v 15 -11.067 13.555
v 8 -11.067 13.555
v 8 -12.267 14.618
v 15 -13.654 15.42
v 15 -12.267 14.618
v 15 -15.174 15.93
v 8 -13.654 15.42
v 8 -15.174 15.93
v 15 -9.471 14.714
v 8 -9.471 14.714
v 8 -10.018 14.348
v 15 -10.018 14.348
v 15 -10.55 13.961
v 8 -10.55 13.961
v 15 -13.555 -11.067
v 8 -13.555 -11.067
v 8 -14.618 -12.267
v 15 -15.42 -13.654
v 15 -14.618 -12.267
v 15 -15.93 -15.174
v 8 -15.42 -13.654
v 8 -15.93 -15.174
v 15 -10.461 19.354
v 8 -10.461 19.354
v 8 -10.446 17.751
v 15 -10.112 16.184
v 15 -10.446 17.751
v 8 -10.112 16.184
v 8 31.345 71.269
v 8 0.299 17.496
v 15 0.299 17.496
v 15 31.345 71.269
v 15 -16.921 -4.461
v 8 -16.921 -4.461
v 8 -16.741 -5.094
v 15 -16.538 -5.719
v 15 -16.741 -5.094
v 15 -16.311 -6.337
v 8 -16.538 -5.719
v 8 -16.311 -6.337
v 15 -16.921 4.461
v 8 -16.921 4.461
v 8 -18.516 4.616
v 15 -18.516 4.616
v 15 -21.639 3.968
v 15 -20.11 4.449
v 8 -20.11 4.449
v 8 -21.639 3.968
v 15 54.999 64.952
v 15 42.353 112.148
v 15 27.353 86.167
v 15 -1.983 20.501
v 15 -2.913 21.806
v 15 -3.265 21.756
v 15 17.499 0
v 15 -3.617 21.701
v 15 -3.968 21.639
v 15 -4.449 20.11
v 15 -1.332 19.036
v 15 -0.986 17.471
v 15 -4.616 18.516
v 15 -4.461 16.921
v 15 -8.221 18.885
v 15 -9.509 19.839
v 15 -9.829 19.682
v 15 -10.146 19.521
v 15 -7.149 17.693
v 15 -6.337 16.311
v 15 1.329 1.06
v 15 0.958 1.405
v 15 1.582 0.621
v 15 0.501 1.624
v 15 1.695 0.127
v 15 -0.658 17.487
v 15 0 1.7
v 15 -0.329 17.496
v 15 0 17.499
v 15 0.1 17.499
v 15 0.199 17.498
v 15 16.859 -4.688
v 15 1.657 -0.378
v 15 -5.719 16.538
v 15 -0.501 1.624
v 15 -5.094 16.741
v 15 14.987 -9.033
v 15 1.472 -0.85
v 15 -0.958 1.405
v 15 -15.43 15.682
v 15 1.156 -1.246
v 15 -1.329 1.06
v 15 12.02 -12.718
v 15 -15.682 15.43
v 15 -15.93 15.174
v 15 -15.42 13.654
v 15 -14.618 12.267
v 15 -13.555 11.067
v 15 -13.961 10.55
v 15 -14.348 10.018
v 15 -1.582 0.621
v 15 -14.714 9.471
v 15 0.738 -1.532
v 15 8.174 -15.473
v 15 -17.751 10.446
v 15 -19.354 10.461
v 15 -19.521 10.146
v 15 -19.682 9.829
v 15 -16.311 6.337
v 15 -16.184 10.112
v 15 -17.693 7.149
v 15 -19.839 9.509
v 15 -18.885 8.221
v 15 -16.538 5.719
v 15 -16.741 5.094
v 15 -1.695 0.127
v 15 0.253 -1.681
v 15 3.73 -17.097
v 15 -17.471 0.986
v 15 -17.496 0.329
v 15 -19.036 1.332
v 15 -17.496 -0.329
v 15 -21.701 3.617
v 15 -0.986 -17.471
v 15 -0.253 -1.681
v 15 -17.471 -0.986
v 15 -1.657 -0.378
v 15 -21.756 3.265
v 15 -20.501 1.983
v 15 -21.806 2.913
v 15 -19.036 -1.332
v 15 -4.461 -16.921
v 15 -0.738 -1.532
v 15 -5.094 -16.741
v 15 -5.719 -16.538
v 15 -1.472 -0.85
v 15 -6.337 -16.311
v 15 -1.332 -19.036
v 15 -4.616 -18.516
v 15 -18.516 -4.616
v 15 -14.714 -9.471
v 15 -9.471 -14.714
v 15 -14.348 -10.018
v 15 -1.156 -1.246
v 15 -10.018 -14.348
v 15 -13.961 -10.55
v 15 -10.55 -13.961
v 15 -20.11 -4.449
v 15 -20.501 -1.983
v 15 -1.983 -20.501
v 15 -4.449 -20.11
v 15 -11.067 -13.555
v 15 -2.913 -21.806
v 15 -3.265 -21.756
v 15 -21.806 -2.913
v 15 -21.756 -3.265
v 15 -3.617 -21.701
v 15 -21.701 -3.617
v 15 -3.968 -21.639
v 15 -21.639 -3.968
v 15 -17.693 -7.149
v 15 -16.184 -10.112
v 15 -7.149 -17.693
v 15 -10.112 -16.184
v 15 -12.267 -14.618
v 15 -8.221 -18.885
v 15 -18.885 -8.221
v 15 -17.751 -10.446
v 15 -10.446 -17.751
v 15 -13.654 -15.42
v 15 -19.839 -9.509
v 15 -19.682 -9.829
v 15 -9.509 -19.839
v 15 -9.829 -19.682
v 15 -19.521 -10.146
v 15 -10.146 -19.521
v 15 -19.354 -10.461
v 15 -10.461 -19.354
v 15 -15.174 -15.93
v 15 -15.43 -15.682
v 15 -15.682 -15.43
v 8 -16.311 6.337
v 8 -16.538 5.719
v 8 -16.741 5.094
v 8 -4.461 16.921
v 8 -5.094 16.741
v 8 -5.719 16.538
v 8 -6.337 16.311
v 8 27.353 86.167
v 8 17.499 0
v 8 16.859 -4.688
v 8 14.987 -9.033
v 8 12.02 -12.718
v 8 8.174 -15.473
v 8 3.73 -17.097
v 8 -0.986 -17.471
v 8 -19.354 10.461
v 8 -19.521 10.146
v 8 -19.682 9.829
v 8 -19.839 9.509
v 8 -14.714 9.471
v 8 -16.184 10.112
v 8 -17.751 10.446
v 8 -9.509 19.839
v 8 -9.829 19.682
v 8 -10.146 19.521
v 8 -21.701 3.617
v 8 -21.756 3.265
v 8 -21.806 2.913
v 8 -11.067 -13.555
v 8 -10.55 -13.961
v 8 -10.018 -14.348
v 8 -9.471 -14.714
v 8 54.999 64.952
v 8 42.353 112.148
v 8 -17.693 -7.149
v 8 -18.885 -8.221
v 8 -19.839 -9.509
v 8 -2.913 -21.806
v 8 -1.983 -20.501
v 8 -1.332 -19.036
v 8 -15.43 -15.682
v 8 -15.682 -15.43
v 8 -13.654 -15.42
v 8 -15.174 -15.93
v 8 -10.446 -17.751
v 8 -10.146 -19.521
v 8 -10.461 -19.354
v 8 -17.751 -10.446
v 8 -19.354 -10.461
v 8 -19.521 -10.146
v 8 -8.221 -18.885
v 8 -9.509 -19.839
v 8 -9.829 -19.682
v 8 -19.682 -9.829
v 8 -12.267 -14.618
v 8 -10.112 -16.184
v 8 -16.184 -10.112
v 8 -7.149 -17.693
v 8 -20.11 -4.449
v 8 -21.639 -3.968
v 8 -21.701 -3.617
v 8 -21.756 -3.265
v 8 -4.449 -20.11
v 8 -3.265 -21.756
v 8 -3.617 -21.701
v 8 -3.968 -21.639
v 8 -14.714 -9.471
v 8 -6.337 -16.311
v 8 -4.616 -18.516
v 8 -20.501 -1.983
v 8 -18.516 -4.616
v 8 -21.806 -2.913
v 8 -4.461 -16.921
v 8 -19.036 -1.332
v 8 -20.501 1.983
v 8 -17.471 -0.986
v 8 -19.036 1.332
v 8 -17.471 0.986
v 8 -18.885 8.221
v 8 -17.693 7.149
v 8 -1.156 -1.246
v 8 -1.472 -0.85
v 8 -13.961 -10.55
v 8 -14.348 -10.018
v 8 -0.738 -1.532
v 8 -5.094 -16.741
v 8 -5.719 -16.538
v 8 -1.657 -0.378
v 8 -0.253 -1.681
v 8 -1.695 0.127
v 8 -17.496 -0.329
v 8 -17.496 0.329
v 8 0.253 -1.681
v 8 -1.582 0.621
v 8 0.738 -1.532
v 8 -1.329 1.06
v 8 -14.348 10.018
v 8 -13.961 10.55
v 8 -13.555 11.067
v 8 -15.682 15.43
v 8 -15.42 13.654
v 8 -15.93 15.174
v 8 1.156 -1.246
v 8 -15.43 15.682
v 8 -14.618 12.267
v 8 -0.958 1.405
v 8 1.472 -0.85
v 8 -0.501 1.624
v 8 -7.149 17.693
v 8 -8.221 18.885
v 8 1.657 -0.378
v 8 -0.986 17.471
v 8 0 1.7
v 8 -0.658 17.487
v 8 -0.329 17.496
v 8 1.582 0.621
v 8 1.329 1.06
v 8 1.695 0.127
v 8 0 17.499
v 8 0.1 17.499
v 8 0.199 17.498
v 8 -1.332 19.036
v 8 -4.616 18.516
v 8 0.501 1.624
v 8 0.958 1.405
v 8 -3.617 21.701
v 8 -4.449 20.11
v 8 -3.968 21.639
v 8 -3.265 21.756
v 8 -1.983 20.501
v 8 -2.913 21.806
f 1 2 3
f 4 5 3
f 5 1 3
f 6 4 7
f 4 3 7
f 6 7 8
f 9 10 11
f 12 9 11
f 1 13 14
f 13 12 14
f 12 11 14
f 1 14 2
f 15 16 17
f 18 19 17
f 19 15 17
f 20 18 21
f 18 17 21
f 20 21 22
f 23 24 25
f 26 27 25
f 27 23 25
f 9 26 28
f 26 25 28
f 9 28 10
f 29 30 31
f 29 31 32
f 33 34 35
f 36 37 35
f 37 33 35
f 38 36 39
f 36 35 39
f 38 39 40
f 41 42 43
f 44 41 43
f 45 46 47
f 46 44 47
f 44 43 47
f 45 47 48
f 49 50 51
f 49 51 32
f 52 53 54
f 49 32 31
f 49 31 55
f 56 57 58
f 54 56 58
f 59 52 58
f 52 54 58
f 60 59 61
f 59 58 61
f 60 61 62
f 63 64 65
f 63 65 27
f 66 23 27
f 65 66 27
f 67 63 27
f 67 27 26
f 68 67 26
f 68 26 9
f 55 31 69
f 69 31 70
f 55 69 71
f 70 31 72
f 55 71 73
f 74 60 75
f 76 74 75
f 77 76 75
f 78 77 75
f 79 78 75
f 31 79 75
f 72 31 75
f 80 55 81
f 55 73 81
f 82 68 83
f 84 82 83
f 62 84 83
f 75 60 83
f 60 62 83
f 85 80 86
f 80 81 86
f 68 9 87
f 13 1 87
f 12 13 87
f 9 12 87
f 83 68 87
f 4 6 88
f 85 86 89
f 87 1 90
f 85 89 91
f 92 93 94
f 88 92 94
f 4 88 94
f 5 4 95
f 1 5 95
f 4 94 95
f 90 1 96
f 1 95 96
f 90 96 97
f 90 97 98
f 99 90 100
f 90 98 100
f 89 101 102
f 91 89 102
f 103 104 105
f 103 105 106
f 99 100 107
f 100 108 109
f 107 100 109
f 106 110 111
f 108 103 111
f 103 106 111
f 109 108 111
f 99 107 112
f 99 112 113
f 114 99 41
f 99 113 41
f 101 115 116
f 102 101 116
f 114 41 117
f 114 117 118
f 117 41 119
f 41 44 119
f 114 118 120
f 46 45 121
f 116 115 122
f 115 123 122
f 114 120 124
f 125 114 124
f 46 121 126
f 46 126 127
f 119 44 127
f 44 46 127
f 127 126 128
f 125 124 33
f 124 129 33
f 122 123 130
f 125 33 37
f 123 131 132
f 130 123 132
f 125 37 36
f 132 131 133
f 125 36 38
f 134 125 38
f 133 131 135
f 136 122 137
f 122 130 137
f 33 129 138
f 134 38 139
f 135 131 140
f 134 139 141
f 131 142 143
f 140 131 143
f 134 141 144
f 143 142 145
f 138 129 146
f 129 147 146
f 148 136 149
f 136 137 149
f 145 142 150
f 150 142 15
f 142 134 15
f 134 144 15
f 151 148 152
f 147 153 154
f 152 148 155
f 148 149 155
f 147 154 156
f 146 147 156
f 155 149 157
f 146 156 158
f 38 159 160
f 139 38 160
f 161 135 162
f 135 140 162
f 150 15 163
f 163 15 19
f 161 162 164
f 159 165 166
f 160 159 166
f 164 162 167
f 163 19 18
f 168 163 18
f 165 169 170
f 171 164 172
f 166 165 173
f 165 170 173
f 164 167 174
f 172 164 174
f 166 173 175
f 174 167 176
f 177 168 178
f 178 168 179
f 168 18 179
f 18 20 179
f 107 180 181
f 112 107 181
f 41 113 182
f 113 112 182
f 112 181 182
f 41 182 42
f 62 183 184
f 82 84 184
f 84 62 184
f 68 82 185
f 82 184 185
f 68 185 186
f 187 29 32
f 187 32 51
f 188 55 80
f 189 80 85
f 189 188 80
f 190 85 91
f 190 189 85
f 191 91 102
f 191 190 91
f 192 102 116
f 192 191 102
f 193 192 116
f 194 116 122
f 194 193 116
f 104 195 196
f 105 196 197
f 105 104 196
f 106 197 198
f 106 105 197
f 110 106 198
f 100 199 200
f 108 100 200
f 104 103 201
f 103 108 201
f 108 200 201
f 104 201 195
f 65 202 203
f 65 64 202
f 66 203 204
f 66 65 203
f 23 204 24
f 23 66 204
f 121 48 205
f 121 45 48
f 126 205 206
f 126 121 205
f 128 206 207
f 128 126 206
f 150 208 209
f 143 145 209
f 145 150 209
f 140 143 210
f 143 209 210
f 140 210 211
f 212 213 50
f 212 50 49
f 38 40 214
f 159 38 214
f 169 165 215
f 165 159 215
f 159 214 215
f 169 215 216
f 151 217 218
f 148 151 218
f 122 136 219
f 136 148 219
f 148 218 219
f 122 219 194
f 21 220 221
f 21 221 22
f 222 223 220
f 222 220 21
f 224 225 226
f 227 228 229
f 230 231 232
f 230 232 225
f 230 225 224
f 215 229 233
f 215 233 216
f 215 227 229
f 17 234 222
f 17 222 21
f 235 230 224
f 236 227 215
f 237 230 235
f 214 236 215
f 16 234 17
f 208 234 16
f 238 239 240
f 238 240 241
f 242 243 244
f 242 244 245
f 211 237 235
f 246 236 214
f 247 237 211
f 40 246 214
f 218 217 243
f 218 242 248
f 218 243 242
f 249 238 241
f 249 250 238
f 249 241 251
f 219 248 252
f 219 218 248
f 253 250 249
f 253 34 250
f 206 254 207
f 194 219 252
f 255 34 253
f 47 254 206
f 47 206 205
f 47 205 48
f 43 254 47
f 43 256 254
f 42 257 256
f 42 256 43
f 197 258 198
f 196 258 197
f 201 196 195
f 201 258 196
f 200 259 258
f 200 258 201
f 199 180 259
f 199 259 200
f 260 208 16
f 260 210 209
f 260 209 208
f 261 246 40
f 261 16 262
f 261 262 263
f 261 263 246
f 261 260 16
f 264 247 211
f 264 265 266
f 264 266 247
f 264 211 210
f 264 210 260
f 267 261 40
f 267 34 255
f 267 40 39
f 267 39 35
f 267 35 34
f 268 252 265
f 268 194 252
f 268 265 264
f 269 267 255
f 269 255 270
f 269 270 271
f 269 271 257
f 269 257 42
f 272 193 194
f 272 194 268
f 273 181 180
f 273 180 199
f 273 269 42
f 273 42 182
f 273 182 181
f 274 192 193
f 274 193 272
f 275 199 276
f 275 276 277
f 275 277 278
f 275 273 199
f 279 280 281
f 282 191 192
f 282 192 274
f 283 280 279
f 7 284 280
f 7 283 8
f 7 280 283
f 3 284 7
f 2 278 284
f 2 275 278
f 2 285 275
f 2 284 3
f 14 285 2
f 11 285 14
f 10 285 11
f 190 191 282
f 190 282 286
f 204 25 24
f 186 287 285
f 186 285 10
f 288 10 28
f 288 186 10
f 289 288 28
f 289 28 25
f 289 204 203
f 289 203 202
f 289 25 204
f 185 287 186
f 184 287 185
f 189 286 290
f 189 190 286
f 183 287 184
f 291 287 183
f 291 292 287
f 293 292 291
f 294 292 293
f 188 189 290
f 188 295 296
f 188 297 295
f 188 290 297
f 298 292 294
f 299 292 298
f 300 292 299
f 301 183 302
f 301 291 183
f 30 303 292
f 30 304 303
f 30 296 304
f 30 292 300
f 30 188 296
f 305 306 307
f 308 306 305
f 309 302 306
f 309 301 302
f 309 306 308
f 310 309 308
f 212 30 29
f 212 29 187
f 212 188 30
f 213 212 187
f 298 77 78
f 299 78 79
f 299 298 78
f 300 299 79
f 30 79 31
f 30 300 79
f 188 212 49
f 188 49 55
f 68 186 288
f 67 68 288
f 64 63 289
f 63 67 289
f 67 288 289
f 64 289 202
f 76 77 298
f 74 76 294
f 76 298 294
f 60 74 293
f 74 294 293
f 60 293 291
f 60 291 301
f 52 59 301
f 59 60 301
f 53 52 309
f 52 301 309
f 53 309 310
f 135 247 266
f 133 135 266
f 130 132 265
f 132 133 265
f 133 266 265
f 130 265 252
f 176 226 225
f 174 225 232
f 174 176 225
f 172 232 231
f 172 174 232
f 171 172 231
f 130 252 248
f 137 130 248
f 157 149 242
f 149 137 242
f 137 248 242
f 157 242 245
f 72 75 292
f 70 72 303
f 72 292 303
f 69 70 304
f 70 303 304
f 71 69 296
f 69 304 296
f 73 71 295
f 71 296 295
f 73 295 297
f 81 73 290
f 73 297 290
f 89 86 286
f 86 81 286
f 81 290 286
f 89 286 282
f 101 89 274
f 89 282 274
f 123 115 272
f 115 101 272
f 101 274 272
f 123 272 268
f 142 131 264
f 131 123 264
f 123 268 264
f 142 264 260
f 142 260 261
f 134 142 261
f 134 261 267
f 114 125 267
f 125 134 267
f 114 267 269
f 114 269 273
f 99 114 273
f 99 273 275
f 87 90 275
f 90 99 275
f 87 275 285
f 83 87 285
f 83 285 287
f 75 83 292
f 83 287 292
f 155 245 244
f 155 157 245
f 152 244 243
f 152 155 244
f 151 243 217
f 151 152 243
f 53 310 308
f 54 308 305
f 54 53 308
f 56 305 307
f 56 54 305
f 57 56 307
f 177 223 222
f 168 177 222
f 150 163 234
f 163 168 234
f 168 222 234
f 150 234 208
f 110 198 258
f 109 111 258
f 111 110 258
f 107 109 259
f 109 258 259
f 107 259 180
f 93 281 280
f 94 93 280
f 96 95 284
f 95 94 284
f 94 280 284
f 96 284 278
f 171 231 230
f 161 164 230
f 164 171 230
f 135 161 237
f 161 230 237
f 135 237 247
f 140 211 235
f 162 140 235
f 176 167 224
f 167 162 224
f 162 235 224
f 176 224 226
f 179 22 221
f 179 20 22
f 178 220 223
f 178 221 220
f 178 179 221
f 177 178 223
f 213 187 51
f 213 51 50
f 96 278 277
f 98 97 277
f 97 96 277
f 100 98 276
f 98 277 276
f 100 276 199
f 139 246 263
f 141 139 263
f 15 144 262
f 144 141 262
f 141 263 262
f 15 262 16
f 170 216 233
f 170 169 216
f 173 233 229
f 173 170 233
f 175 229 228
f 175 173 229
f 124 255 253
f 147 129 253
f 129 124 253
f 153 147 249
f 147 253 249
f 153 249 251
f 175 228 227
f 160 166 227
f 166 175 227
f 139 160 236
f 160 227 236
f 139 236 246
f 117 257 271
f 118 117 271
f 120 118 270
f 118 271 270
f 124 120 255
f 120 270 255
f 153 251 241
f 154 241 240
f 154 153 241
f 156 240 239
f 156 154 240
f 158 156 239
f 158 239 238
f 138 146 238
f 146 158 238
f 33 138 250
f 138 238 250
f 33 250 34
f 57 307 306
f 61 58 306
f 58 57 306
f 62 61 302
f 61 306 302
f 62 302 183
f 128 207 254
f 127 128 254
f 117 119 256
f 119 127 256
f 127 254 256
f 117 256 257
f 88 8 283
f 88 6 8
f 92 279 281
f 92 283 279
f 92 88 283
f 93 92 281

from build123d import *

# Parameters (mm, degrees)
BASPROSKE_W         = 15
BASPROSKE_H         = 22
TOOTHCUT_DEPTH      = 35.539832078
TEETHCUTS_COUNT     = 20
TEETHCUTS_ANGLE     = 342
BORSKE_R            = 0.5
BORE_DEPTH          = 50.0000508
SKETCH1_R           = 11.1
CUT_EXTRUDE1_DEPTH  = 16
CUT_EXTRUDE2_DEPTH  = 8
SKETCH3_R           = 11.1
BOSS_EXTRUDE2_DEPTH = 7
SKETCH5_W           = 56.998857039
SKETCH5_H           = 22.722114901
CUT_EXTRUDE3_DEPTH  = 7
SKETCH6_R           = 17.499
BOSS_EXTRUDE3_DEPTH = 7
SKETCH7_R           = 1.7
CUT_EXTRUDE4_DEPTH  = 7
BOSS_EXTRUDE5_DEPTH = 7


with BuildPart() as part:
    # BasProSke → Base-Revolve (revolve)
    with BuildSketch(Plane(origin=(0, 0, 0), x_dir=(1, 0, 0), z_dir=(0, 1, 0)), mode=Mode.PRIVATE) as base_revolve_sk:
        with Locations((7.5, 11)):
            Rectangle(BASPROSKE_W, BASPROSKE_H)
    revolve(base_revolve_sk.sketch.rotate(Axis((-10, 0, 0), (1, 0, 0)), 180), axis=Axis((-10, 0, 0), (1, 0, 0)))

    # TooCutSke → ToothCut (cut, through all)
    with BuildSketch(Plane(origin=(0, 0, 0), x_dir=(0, 0, -1), z_dir=(1, 0, 0))):
        with BuildLine():
            ThreePointArc((0.986171591, 17.471189616), (0, 17.499), (-0.986171591, 17.471189616))
            ThreePointArc((-0.986171591, 17.471189616), (-1.626916196, 19.798789858), (-2.932850173, 21.829260982))
            ThreePointArc((-2.932850173, 21.829260982), (0, 22.0254), (2.932850173, 21.829260982))
            ThreePointArc((2.932850173, 21.829260982), (1.626916196, 19.798789858), (0.986171591, 17.471189616))
        make_face()
    toothcut = extrude(amount=TOOTHCUT_DEPTH, mode=Mode.SUBTRACT)

    # TeethCuts: ToothCut ×20 about axis
    teethcuts_axis = Axis((-10, 0, 0), (1, 0, 0))
    for i in range(1, TEETHCUTS_COUNT):
        add(toothcut.rotate(teethcuts_axis, i * TEETHCUTS_ANGLE / (TEETHCUTS_COUNT - 1)), mode=Mode.SUBTRACT)

    # BorSke → Bore (cut, symmetric)
    with BuildSketch(Plane(origin=(0, 0, 0), x_dir=(0, 0, -1), z_dir=(1, 0, 0))):
        with Locations(Location((0, 0, 0), (0, 0, 180))):
            Circle(BORSKE_R)
    extrude(amount=BORE_DEPTH, both=True, mode=Mode.SUBTRACT)

    # Sketch1 → Cut-Extrude1 (cut)
    with BuildSketch(Plane.ZY):
        Circle(SKETCH1_R)
    extrude(amount=-CUT_EXTRUDE1_DEPTH, mode=Mode.SUBTRACT)

    # Sketch2 → Cut-Extrude2 (cut)
    with BuildSketch(Plane.ZY):
        with BuildLine():
            ThreePointArc((17.471189616, 0.986171591), (19.784848102, 1.620704589), (21.806333941, 2.912696354))
            ThreePointArc((21.806333941, 2.912696354), (21.729143493, 3.441558231), (21.639128664, 3.968388926))
            ThreePointArc((21.639128664, 3.968388926), (19.317333972, 4.572472634), (16.920832513, 4.460989585))
            ThreePointArc((16.920832513, 4.460989585), (16.642537979, 5.407488385), (16.31134495, 6.336799421))
            ThreePointArc((16.31134495, 6.336799421), (18.31568345, 7.655235955), (19.838983319, 9.50866662))
            ThreePointArc((19.838983319, 9.50866662), (19.602143532, 9.987790994), (19.353734704, 10.461020648))
            ThreePointArc((19.353734704, 10.461020648), (16.958904602, 10.318064378), (14.714146429, 9.471478019))
            ThreePointArc((14.714146429, 9.471478019), (14.156988385, 10.28565413), (13.554832194, 11.067137173))
            ThreePointArc((13.554832194, 11.067137173), (15.05365209, 12.940419489), (15.929654782, 15.173862347))
            ThreePointArc((15.929654782, 15.173862347), (15.556349186, 15.556349186), (15.173862347, 15.929654782))
            ThreePointArc((15.173862347, 15.929654782), (12.940419489, 15.05365209), (11.067137173, 13.554832194))
            ThreePointArc((11.067137173, 13.554832194), (10.28565413, 14.156988385), (9.471478019, 14.714146429))
            ThreePointArc((9.471478019, 14.714146429), (10.318064378, 16.958904602), (10.461020648, 19.353734704))
            ThreePointArc((10.461020648, 19.353734704), (9.987790994, 19.602143532), (9.50866662, 19.838983319))
            ThreePointArc((9.50866662, 19.838983319), (7.655235955, 18.31568345), (6.336799421, 16.31134495))
            ThreePointArc((6.336799421, 16.31134495), (5.407488385, 16.642537979), (4.460989585, 16.920832513))
            ThreePointArc((4.460989585, 16.920832513), (4.572472634, 19.317333972), (3.968388926, 21.639128664))
            ThreePointArc((3.968388926, 21.639128664), (3.441558231, 21.729143493), (2.912696354, 21.806333941))
            ThreePointArc((2.912696354, 21.806333941), (1.620704589, 19.784848102), (0.986171591, 17.471189616))
            ThreePointArc((0.986171591, 17.471189616), (0, 17.499), (-0.986171591, 17.471189616))
            ThreePointArc((-0.986171591, 17.471189616), (-1.620704589, 19.784848102), (-2.912696354, 21.806333941))
            ThreePointArc((-2.912696354, 21.806333941), (-3.441558231, 21.729143493), (-3.968388926, 21.639128664))
            ThreePointArc((-3.968388926, 21.639128664), (-4.572472634, 19.317333972), (-4.460989585, 16.920832513))
            ThreePointArc((-4.460989585, 16.920832513), (-5.407488385, 16.642537979), (-6.336799421, 16.31134495))
            ThreePointArc((-6.336799421, 16.31134495), (-7.655235955, 18.31568345), (-9.50866662, 19.838983319))
            ThreePointArc((-9.50866662, 19.838983319), (-9.987790994, 19.602143532), (-10.461020648, 19.353734704))
            ThreePointArc((-10.461020648, 19.353734704), (-10.318064378, 16.958904602), (-9.471478019, 14.714146429))
            ThreePointArc((-9.471478019, 14.714146429), (-10.28565413, 14.156988385), (-11.067137173, 13.554832194))
            ThreePointArc((-11.067137173, 13.554832194), (-12.940419489, 15.05365209), (-15.173862347, 15.929654782))
            ThreePointArc((-15.173862347, 15.929654782), (-15.556349186, 15.556349186), (-15.929654782, 15.173862347))
            ThreePointArc((-15.929654782, 15.173862347), (-15.05365209, 12.940419489), (-13.554832194, 11.067137173))
            ThreePointArc((-13.554832194, 11.067137173), (-14.156988385, 10.28565413), (-14.714146429, 9.471478019))
            ThreePointArc((-14.714146429, 9.471478019), (-16.958904602, 10.318064378), (-19.353734704, 10.461020648))
            ThreePointArc((-19.353734704, 10.461020648), (-19.602143532, 9.987790994), (-19.838983319, 9.50866662))
            ThreePointArc((-19.838983319, 9.50866662), (-18.31568345, 7.655235955), (-16.31134495, 6.336799421))
            ThreePointArc((-16.31134495, 6.336799421), (-16.642537979, 5.407488385), (-16.920832513, 4.460989585))
            ThreePointArc((-16.920832513, 4.460989585), (-19.317333972, 4.572472634), (-21.639128664, 3.968388926))
            ThreePointArc((-21.639128664, 3.968388926), (-21.729143493, 3.441558231), (-21.806333941, 2.912696354))
            ThreePointArc((-21.806333941, 2.912696354), (-19.784848102, 1.620704589), (-17.471189616, 0.986171591))
            ThreePointArc((-17.471189616, 0.986171591), (-17.499, 0), (-17.471189616, -0.986171591))
            ThreePointArc((-17.471189616, -0.986171591), (-19.784848102, -1.620704589), (-21.806333941, -2.912696354))
            ThreePointArc((-21.806333941, -2.912696354), (-21.729143493, -3.441558231), (-21.639128664, -3.968388926))
            ThreePointArc((-21.639128664, -3.968388926), (-19.317333972, -4.572472634), (-16.920832513, -4.460989585))
            ThreePointArc((-16.920832513, -4.460989585), (-16.642537979, -5.407488385), (-16.31134495, -6.336799421))
            ThreePointArc((-16.31134495, -6.336799421), (-18.31568345, -7.655235955), (-19.838983319, -9.50866662))
            ThreePointArc((-19.838983319, -9.50866662), (-19.602143532, -9.987790994), (-19.353734704, -10.461020648))
            ThreePointArc((-19.353734704, -10.461020648), (-16.958904602, -10.318064378), (-14.714146429, -9.471478019))
            ThreePointArc((-14.714146429, -9.471478019), (-14.156988385, -10.28565413), (-13.554832194, -11.067137173))
            ThreePointArc((-13.554832194, -11.067137173), (-15.05365209, -12.940419489), (-15.929654782, -15.173862347))
            ThreePointArc((-15.929654782, -15.173862347), (-15.556349186, -15.556349186), (-15.173862347, -15.929654782))
            ThreePointArc((-15.173862347, -15.929654782), (-12.940419489, -15.05365209), (-11.067137173, -13.554832194))
            ThreePointArc((-11.067137173, -13.554832194), (-10.28565413, -14.156988385), (-9.471478019, -14.714146429))
            ThreePointArc((-9.471478019, -14.714146429), (-10.318064378, -16.958904602), (-10.461020648, -19.353734704))
            ThreePointArc((-10.461020648, -19.353734704), (-9.987790994, -19.602143532), (-9.50866662, -19.838983319))
            ThreePointArc((-9.50866662, -19.838983319), (-7.655235955, -18.31568345), (-6.336799421, -16.31134495))
            ThreePointArc((-6.336799421, -16.31134495), (-5.407488385, -16.642537979), (-4.460989585, -16.920832513))
            ThreePointArc((-4.460989585, -16.920832513), (-4.572472634, -19.317333972), (-3.968388926, -21.639128664))
            ThreePointArc((-3.968388926, -21.639128664), (-3.441558231, -21.729143493), (-2.912696354, -21.806333941))
            ThreePointArc((-2.912696354, -21.806333941), (-1.620704589, -19.784848102), (-0.986171591, -17.471189616))
            ThreePointArc((-0.986171591, -17.471189616), (0, -17.499), (0.986171591, -17.471189616))
            ThreePointArc((0.986171591, -17.471189616), (1.620704589, -19.784848102), (2.912696354, -21.806333941))
            ThreePointArc((2.912696354, -21.806333941), (3.441558231, -21.729143493), (3.968388926, -21.639128664))
            ThreePointArc((3.968388926, -21.639128664), (4.572472634, -19.317333972), (4.460989585, -16.920832513))
            ThreePointArc((4.460989585, -16.920832513), (5.407488385, -16.642537979), (6.336799421, -16.31134495))
            ThreePointArc((6.336799421, -16.31134495), (7.655235955, -18.31568345), (9.50866662, -19.838983319))
            ThreePointArc((9.50866662, -19.838983319), (9.987790994, -19.602143532), (10.461020648, -19.353734704))
            ThreePointArc((10.461020648, -19.353734704), (10.318064378, -16.958904602), (9.471478019, -14.714146429))
            ThreePointArc((9.471478019, -14.714146429), (10.28565413, -14.156988385), (11.067137173, -13.554832194))
            ThreePointArc((11.067137173, -13.554832194), (12.940419489, -15.05365209), (15.173862347, -15.929654782))
            ThreePointArc((15.173862347, -15.929654782), (15.556349186, -15.556349186), (15.929654782, -15.173862347))
            ThreePointArc((15.929654782, -15.173862347), (15.05365209, -12.940419489), (13.554832194, -11.067137173))
            ThreePointArc((13.554832194, -11.067137173), (14.156988385, -10.28565413), (14.714146429, -9.471478019))
            ThreePointArc((14.714146429, -9.471478019), (16.958904602, -10.318064378), (19.353734704, -10.461020648))
            ThreePointArc((19.353734704, -10.461020648), (19.602143532, -9.987790994), (19.838983319, -9.50866662))
            ThreePointArc((19.838983319, -9.50866662), (18.31568345, -7.655235955), (16.31134495, -6.336799421))
            ThreePointArc((16.31134495, -6.336799421), (16.642537979, -5.407488385), (16.920832513, -4.460989585))
            ThreePointArc((16.920832513, -4.460989585), (19.317333972, -4.572472634), (21.639128664, -3.968388926))
            ThreePointArc((21.639128664, -3.968388926), (21.729143493, -3.441558231), (21.806333941, -2.912696354))
            ThreePointArc((21.806333941, -2.912696354), (19.784848102, -1.620704589), (17.471189616, -0.986171591))
            ThreePointArc((17.471189616, -0.986171591), (17.499, 0), (17.471189616, 0.986171591))
        make_face()
    extrude(amount=-CUT_EXTRUDE2_DEPTH, mode=Mode.SUBTRACT)

    # Sketch3 → Boss-Extrude2 (add)
    with BuildSketch(Plane.ZY.offset(-8)):
        Circle(SKETCH3_R)
    extrude(amount=-BOSS_EXTRUDE2_DEPTH)

    # Sketch5 → Cut-Extrude3 (cut)
    with BuildSketch(Plane.ZY.offset(-8)):
        with Locations((-1.101858783, 11.361057451)):
            Rectangle(SKETCH5_W, SKETCH5_H)
    extrude(amount=-CUT_EXTRUDE3_DEPTH, mode=Mode.SUBTRACT)

    # Sketch6 → Boss-Extrude3 (add)
    with BuildSketch(Plane.ZY.offset(-8)):
        Circle(SKETCH6_R)
    extrude(amount=-BOSS_EXTRUDE3_DEPTH)

    # Sketch7 → Cut-Extrude4 (cut)
    with BuildSketch(Plane.ZY.offset(-8)):
        Circle(SKETCH7_R)
    extrude(amount=-CUT_EXTRUDE4_DEPTH, mode=Mode.SUBTRACT)

    # Sketch8 → Boss-Extrude5 (add)
    with BuildSketch(Plane.ZY.offset(-8)):
        with BuildLine():
            Line((64.951905284, 54.999), (0, 17.499))
            ThreePointArc((0, 17.499), (12.267429085, 12.478989729), (17.496442259, 0.299180999))
            Line((17.496442259, 0.299180999), (71.26903982, 31.344804676))
            Line((71.26903982, 31.344804676), (86.167351448, 27.352814106))
            Line((86.167351448, 27.352814106), (112.148113562, 42.352814106))
            Line((112.148113562, 42.352814106), (64.951905284, 54.999))
        make_face()
    extrude(amount=-BOSS_EXTRUDE5_DEPTH)


solid = part.part
